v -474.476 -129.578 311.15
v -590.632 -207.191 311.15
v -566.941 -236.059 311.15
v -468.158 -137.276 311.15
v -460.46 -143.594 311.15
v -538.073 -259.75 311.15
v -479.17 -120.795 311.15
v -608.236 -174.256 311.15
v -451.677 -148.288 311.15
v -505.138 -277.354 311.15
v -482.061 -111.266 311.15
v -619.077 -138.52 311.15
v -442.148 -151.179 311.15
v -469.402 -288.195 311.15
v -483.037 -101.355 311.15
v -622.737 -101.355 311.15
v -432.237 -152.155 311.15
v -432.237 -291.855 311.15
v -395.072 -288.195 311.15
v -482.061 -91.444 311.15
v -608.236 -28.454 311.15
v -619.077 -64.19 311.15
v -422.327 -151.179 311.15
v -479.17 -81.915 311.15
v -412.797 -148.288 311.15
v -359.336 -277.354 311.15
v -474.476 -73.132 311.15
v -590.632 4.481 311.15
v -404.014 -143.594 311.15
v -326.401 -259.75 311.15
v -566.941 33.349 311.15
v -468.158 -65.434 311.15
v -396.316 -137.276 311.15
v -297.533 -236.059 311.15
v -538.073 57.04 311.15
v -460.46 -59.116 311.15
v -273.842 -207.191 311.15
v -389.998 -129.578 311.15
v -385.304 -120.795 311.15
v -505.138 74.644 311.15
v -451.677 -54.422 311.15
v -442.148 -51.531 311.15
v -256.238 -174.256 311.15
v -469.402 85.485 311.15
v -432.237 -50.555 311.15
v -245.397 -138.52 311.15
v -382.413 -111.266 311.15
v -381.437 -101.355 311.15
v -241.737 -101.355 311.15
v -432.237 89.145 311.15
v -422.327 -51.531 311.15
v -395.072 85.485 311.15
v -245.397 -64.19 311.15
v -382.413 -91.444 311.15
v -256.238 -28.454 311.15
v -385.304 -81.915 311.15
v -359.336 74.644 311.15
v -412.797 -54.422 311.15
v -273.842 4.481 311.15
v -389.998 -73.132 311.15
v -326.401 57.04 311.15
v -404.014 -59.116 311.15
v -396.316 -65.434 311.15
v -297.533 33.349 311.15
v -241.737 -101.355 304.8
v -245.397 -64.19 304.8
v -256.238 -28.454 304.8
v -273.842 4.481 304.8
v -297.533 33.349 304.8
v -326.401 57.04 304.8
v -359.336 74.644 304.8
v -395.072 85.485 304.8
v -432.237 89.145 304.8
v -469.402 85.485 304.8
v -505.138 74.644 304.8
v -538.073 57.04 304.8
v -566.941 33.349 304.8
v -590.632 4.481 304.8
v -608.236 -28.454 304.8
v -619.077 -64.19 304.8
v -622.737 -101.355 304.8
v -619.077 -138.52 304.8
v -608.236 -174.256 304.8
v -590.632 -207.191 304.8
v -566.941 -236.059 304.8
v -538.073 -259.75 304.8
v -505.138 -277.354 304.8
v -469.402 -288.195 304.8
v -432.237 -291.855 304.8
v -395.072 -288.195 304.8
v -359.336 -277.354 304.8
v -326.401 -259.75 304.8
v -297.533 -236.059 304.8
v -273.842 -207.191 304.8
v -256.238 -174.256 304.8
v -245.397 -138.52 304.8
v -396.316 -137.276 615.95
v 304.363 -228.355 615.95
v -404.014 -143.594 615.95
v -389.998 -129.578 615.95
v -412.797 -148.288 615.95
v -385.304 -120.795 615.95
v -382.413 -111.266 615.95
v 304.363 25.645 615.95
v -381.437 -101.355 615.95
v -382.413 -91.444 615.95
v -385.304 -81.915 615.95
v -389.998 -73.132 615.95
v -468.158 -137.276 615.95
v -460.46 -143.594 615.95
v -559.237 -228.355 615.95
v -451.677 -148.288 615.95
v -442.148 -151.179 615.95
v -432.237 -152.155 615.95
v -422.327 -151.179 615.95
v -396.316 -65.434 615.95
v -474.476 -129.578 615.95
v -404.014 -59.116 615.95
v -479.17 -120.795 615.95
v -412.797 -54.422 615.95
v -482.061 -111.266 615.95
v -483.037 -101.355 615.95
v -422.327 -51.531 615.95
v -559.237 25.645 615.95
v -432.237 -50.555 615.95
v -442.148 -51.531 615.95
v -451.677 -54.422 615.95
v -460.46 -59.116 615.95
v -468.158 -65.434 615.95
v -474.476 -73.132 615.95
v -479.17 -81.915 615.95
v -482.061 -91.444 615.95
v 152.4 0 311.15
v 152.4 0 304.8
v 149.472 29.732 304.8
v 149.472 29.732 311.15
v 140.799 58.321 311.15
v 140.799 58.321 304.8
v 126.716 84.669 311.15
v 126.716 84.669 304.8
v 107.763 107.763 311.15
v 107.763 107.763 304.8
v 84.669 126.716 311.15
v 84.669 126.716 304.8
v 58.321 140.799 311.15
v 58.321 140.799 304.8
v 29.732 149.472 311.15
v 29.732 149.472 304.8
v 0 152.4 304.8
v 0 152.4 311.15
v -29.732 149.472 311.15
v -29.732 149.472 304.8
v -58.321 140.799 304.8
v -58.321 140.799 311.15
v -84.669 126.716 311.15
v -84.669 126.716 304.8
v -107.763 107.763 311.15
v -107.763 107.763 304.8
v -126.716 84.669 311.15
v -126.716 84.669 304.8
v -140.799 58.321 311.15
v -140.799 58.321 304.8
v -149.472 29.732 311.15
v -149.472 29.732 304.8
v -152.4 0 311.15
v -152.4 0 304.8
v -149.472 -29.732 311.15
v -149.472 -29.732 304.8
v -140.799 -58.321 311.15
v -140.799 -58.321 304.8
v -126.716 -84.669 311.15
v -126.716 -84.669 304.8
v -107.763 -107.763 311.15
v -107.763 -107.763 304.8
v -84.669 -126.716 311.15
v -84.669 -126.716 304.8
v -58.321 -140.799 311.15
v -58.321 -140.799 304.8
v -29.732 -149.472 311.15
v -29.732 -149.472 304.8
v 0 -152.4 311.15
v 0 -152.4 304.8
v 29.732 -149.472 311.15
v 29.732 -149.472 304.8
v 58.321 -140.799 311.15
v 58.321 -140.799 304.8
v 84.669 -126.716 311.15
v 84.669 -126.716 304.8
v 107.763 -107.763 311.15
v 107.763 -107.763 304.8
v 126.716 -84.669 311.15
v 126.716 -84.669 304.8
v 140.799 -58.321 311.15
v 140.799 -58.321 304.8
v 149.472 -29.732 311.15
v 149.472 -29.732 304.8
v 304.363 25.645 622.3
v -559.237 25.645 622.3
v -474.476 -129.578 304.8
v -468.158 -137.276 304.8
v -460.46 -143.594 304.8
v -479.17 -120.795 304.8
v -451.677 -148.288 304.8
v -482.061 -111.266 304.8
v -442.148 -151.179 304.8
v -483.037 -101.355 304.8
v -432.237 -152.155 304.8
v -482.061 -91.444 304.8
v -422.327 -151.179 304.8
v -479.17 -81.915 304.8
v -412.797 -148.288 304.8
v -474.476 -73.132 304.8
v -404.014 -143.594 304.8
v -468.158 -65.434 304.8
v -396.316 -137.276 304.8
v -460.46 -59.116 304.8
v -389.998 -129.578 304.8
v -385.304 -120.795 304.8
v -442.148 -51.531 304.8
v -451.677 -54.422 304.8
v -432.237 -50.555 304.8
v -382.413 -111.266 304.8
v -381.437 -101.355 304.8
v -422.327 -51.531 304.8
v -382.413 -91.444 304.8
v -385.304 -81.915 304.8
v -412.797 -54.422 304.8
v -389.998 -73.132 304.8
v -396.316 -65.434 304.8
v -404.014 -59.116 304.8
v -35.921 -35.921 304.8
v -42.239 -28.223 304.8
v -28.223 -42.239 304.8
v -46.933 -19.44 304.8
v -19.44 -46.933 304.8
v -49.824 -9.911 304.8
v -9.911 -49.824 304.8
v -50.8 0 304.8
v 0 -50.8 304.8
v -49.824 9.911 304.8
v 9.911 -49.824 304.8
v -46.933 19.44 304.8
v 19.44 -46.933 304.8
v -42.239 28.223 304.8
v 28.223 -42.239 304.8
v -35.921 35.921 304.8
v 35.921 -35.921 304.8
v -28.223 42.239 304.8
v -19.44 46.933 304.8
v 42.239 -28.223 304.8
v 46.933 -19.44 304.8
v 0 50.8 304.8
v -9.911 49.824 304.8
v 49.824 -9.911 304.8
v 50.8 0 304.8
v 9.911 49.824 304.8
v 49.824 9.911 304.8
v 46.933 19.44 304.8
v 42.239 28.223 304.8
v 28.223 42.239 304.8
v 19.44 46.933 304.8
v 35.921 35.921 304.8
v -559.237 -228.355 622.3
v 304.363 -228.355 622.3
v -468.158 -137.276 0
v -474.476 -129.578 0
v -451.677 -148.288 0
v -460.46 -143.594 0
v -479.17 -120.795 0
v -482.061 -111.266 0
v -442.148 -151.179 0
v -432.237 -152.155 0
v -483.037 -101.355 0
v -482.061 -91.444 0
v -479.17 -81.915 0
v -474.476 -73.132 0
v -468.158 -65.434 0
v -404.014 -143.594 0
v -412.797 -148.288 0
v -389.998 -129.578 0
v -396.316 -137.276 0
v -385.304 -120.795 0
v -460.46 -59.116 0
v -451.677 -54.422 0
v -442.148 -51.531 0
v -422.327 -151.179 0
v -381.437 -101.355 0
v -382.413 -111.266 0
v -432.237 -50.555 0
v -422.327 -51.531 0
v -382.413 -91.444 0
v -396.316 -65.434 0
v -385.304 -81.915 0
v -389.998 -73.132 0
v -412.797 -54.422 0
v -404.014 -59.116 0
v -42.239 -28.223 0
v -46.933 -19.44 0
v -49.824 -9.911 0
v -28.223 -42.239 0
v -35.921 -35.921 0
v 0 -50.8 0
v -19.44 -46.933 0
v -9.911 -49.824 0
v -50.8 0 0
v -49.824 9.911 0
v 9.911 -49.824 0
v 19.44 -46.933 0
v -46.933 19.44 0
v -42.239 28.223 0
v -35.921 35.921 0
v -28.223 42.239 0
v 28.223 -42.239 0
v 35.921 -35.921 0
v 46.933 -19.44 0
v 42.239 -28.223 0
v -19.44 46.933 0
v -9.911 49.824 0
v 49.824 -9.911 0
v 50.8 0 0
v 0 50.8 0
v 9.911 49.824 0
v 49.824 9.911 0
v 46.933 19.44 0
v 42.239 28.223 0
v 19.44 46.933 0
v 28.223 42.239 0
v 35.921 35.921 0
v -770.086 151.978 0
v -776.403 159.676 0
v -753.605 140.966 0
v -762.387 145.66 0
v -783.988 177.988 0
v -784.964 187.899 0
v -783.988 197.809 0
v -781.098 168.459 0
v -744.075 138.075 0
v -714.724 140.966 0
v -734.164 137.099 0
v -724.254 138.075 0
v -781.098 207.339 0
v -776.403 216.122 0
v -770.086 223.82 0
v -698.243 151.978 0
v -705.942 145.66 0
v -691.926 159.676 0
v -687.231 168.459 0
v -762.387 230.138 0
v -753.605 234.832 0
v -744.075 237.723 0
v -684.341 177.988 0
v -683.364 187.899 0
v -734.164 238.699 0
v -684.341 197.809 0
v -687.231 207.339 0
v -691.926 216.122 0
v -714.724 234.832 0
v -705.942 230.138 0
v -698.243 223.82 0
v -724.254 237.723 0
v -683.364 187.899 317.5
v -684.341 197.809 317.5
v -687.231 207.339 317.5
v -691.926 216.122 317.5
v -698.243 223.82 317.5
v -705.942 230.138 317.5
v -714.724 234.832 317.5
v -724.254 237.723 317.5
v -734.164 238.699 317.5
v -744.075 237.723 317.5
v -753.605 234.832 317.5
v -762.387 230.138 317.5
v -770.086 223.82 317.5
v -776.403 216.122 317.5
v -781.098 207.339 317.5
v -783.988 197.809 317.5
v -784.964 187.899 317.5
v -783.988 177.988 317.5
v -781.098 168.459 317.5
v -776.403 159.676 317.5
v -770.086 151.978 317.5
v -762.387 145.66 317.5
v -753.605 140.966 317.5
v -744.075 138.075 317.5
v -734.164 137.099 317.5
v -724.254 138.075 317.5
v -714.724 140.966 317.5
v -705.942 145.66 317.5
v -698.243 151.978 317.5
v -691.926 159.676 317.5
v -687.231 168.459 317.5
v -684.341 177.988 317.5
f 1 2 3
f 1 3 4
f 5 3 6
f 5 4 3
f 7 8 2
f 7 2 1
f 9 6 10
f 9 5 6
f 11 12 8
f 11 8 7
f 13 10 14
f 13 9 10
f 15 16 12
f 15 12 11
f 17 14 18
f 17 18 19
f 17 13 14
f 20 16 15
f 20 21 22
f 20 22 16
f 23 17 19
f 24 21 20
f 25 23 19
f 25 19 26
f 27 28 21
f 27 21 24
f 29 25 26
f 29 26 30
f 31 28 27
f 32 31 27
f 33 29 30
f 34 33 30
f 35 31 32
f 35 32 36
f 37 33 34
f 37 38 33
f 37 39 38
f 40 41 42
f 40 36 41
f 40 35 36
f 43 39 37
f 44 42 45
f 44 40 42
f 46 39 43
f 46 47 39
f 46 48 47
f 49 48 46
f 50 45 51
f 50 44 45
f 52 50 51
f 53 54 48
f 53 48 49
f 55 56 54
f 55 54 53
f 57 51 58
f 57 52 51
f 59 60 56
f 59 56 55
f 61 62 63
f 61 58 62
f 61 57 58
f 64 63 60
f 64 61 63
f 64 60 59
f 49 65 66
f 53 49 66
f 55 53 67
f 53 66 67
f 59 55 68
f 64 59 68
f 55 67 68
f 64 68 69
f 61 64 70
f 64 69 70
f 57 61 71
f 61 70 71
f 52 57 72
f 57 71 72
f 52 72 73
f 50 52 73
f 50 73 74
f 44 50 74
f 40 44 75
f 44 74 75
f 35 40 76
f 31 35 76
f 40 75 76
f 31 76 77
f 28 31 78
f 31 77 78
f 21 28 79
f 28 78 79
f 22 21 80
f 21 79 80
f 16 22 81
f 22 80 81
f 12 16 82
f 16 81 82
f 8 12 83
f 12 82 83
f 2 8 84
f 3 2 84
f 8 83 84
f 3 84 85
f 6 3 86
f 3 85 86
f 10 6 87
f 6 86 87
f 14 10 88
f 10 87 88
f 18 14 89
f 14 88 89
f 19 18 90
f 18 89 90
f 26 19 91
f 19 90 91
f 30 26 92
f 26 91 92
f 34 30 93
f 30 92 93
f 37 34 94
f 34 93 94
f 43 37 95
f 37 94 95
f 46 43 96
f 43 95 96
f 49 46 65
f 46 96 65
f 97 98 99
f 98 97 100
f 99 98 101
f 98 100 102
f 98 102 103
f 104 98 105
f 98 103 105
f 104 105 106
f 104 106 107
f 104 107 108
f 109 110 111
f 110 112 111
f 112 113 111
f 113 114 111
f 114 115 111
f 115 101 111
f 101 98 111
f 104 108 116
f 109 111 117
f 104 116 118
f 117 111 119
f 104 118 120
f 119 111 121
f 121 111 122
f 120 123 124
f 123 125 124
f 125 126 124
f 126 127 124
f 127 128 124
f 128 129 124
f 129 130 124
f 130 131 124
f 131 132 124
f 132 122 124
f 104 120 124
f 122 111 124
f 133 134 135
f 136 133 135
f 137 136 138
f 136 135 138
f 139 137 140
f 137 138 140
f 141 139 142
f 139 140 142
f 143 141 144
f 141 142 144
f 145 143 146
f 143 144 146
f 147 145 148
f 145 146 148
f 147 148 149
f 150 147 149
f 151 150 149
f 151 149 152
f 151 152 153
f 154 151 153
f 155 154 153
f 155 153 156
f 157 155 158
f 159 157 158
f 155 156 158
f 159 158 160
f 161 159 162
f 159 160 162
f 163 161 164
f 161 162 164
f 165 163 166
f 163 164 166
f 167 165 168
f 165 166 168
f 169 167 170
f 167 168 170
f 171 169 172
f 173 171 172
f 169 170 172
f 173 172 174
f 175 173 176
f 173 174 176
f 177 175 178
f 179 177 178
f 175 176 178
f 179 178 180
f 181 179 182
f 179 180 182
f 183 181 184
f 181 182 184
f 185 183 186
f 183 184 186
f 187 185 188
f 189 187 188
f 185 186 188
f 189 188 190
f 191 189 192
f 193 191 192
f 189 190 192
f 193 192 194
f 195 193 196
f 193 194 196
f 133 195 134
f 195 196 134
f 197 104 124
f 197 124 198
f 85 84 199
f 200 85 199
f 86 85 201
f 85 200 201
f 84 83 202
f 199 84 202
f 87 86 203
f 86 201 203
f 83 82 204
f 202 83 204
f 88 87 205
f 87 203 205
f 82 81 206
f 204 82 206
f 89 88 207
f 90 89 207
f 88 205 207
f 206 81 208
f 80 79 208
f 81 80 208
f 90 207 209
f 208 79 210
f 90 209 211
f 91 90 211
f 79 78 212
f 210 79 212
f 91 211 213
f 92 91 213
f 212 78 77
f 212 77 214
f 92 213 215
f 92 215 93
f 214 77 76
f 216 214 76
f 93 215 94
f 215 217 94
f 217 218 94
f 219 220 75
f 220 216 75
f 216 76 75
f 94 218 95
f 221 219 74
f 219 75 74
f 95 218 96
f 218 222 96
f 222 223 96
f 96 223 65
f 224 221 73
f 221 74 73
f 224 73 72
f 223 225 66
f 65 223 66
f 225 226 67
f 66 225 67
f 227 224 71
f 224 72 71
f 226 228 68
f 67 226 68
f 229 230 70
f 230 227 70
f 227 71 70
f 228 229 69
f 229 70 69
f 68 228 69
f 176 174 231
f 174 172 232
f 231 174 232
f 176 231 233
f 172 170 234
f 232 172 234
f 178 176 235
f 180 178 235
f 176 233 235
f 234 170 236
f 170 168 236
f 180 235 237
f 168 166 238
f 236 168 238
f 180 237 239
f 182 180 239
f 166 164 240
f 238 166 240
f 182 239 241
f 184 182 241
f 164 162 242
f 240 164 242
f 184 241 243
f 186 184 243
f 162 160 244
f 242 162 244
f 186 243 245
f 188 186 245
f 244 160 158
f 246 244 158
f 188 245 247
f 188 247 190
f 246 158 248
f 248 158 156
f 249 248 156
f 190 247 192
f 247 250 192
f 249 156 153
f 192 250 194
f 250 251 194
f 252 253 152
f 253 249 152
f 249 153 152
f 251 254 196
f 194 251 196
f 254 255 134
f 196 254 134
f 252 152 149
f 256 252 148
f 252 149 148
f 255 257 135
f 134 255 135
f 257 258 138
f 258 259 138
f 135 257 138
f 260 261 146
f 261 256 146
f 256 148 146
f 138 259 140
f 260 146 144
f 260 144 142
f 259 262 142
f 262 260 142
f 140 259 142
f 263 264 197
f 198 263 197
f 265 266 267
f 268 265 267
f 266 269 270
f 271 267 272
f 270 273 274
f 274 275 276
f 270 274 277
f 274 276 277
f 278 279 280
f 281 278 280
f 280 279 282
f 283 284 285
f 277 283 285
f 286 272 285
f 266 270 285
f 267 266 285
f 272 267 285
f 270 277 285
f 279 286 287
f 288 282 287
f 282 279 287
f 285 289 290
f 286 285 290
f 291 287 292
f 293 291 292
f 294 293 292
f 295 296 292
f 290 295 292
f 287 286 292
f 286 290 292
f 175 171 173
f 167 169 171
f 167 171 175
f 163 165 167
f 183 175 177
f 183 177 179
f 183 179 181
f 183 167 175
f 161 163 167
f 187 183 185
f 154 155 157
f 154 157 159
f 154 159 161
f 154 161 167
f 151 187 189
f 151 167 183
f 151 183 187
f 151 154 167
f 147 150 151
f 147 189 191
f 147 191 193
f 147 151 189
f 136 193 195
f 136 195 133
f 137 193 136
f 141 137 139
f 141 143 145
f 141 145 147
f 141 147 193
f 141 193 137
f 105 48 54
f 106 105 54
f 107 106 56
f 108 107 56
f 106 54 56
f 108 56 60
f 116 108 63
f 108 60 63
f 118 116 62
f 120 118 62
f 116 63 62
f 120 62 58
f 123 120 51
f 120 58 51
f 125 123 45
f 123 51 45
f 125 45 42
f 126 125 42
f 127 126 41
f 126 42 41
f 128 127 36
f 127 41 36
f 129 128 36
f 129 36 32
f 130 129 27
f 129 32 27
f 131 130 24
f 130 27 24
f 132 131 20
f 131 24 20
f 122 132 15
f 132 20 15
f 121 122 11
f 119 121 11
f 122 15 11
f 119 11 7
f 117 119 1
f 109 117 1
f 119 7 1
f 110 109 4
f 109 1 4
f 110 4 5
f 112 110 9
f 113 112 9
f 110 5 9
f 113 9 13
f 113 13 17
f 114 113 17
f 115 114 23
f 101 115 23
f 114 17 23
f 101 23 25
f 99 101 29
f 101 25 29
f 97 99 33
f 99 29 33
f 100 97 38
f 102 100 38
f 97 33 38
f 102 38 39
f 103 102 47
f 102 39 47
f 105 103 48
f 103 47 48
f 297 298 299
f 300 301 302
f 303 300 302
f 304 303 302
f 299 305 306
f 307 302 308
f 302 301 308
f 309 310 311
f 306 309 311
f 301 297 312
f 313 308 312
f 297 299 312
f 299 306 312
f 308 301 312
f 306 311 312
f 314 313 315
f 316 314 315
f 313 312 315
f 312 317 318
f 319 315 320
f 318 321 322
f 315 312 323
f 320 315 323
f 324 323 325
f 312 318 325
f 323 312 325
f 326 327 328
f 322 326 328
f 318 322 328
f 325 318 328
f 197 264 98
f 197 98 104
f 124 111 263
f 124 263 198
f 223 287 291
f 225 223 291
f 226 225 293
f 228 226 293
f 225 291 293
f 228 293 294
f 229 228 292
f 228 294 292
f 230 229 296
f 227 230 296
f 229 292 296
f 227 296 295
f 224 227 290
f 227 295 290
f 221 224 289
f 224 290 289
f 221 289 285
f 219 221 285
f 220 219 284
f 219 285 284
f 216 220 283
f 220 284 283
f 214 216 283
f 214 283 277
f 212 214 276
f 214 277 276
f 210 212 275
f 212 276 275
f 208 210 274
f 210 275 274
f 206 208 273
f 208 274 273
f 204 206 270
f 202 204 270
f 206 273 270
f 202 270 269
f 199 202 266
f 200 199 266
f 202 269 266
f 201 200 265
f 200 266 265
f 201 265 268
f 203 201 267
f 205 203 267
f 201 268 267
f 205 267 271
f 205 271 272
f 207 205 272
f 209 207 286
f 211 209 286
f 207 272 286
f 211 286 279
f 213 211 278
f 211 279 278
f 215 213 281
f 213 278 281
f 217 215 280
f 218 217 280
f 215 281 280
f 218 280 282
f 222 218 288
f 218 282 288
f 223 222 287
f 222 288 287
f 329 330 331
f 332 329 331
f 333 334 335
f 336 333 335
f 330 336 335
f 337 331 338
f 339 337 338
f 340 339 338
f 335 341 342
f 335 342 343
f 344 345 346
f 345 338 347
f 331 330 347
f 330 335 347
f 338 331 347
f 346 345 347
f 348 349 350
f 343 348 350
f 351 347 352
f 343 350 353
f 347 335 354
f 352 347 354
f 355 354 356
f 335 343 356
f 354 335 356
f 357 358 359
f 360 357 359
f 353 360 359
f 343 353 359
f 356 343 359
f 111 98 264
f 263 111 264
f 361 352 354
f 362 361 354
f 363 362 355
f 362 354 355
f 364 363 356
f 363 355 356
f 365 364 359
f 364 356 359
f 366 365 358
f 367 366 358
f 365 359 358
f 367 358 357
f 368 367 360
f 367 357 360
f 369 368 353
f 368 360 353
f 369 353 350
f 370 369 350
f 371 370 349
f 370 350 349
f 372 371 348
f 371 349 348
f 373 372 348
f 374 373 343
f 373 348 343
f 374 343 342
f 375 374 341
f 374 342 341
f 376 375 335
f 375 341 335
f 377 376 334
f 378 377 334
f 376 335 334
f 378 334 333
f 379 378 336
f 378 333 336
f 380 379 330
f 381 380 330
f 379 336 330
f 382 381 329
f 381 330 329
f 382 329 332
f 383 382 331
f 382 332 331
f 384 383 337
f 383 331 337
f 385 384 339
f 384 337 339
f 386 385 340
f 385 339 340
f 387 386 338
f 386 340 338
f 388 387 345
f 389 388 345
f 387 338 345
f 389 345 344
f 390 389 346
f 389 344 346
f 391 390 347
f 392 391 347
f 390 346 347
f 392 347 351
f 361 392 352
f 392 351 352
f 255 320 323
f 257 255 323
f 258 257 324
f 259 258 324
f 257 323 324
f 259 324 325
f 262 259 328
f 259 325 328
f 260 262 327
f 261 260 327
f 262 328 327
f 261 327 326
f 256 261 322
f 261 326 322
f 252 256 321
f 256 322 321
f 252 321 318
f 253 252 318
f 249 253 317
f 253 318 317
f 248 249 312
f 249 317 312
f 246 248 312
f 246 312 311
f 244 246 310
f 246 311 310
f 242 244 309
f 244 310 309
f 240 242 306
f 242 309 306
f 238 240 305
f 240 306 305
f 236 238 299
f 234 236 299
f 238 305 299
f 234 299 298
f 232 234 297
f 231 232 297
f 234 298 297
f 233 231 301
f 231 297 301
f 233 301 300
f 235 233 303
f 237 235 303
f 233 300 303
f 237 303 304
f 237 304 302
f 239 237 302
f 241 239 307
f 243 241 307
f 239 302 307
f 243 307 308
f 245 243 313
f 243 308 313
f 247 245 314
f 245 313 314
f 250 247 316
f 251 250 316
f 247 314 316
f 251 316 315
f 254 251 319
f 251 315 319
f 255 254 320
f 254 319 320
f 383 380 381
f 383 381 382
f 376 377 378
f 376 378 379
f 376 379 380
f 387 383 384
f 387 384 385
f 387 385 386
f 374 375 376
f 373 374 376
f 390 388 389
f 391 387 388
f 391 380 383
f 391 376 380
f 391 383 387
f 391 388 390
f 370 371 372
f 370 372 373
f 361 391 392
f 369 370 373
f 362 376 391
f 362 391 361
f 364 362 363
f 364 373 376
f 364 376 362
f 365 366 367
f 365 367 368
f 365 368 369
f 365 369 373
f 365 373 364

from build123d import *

# Parameters (mm, degrees)
F0_R      = 50.8
F1_DEPTH  = 304.8
F2_R      = 152.4
F3_DEPTH  = 6.35
F4_R      = 50.8
F5_DEPTH  = 304.8
F6_R      = 190.5
F7_DEPTH  = 6.35
F8_R      = 50.8
F9_DEPTH  = 304.8
F10_W     = 254
F10_H     = 254
F11_DEPTH = 6.35
F12_W     = 254
F12_H     = 6.35
F13_DEPTH = 609.6
F14_R     = 50.8
F15_DEPTH = 317.5


with BuildPart() as f1:
    # F0 (on Top) → F1 (new body)
    with BuildSketch(Plane.XY):
        Circle(F0_R)
    extrude(amount=F1_DEPTH)

    # F2 (on face) → F3 (join)
    with BuildSketch(Plane.XY.offset(304.8)):
        Circle(F2_R)
    extrude(amount=F3_DEPTH)


with BuildPart() as f5:
    # F4 (on Top) → F5 (new body)
    with BuildSketch(Plane.XY):
        with Locations((-432.2370886803, -101.3549640775)):
            Circle(F4_R)
    extrude(amount=F5_DEPTH)

    # F6 (on face) → F7 (join)
    with BuildSketch(Plane.XY.offset(304.8)):
        with Locations((-432.2370886803, -101.3549640775)):
            Circle(F6_R)
    extrude(amount=F7_DEPTH)

    # F8 (on face) → F9 (join)
    with BuildSketch(Plane.XY.offset(311.15)):
        with Locations((-432.2370886803, -101.3549640775)):
            Circle(F8_R)
    extrude(amount=F9_DEPTH)

    # F10 (on face) → F11 (join)
    with BuildSketch(Plane.XY.offset(615.95)):
        with Locations((-432.2370886803, -101.3549640775)):
            Rectangle(F10_W, F10_H)
    extrude(amount=F11_DEPTH)

    # F12 (on face) → F13 (join)
    with BuildSketch(Plane.YZ.offset(-305.2370886803)):
        with Locations((-101.3549640775, 619.125)):
            Rectangle(F12_W, F12_H)
    extrude(amount=F13_DEPTH)


with BuildPart() as f15:
    # F14 (on Top) → F15 (new body)
    with BuildSketch(Plane.XY):
        with Locations((-734.1644763947, 187.8988742828)):
            Circle(F14_R)
    extrude(amount=F15_DEPTH)


solid = Compound([f1.part, f5.part, f15.part])
